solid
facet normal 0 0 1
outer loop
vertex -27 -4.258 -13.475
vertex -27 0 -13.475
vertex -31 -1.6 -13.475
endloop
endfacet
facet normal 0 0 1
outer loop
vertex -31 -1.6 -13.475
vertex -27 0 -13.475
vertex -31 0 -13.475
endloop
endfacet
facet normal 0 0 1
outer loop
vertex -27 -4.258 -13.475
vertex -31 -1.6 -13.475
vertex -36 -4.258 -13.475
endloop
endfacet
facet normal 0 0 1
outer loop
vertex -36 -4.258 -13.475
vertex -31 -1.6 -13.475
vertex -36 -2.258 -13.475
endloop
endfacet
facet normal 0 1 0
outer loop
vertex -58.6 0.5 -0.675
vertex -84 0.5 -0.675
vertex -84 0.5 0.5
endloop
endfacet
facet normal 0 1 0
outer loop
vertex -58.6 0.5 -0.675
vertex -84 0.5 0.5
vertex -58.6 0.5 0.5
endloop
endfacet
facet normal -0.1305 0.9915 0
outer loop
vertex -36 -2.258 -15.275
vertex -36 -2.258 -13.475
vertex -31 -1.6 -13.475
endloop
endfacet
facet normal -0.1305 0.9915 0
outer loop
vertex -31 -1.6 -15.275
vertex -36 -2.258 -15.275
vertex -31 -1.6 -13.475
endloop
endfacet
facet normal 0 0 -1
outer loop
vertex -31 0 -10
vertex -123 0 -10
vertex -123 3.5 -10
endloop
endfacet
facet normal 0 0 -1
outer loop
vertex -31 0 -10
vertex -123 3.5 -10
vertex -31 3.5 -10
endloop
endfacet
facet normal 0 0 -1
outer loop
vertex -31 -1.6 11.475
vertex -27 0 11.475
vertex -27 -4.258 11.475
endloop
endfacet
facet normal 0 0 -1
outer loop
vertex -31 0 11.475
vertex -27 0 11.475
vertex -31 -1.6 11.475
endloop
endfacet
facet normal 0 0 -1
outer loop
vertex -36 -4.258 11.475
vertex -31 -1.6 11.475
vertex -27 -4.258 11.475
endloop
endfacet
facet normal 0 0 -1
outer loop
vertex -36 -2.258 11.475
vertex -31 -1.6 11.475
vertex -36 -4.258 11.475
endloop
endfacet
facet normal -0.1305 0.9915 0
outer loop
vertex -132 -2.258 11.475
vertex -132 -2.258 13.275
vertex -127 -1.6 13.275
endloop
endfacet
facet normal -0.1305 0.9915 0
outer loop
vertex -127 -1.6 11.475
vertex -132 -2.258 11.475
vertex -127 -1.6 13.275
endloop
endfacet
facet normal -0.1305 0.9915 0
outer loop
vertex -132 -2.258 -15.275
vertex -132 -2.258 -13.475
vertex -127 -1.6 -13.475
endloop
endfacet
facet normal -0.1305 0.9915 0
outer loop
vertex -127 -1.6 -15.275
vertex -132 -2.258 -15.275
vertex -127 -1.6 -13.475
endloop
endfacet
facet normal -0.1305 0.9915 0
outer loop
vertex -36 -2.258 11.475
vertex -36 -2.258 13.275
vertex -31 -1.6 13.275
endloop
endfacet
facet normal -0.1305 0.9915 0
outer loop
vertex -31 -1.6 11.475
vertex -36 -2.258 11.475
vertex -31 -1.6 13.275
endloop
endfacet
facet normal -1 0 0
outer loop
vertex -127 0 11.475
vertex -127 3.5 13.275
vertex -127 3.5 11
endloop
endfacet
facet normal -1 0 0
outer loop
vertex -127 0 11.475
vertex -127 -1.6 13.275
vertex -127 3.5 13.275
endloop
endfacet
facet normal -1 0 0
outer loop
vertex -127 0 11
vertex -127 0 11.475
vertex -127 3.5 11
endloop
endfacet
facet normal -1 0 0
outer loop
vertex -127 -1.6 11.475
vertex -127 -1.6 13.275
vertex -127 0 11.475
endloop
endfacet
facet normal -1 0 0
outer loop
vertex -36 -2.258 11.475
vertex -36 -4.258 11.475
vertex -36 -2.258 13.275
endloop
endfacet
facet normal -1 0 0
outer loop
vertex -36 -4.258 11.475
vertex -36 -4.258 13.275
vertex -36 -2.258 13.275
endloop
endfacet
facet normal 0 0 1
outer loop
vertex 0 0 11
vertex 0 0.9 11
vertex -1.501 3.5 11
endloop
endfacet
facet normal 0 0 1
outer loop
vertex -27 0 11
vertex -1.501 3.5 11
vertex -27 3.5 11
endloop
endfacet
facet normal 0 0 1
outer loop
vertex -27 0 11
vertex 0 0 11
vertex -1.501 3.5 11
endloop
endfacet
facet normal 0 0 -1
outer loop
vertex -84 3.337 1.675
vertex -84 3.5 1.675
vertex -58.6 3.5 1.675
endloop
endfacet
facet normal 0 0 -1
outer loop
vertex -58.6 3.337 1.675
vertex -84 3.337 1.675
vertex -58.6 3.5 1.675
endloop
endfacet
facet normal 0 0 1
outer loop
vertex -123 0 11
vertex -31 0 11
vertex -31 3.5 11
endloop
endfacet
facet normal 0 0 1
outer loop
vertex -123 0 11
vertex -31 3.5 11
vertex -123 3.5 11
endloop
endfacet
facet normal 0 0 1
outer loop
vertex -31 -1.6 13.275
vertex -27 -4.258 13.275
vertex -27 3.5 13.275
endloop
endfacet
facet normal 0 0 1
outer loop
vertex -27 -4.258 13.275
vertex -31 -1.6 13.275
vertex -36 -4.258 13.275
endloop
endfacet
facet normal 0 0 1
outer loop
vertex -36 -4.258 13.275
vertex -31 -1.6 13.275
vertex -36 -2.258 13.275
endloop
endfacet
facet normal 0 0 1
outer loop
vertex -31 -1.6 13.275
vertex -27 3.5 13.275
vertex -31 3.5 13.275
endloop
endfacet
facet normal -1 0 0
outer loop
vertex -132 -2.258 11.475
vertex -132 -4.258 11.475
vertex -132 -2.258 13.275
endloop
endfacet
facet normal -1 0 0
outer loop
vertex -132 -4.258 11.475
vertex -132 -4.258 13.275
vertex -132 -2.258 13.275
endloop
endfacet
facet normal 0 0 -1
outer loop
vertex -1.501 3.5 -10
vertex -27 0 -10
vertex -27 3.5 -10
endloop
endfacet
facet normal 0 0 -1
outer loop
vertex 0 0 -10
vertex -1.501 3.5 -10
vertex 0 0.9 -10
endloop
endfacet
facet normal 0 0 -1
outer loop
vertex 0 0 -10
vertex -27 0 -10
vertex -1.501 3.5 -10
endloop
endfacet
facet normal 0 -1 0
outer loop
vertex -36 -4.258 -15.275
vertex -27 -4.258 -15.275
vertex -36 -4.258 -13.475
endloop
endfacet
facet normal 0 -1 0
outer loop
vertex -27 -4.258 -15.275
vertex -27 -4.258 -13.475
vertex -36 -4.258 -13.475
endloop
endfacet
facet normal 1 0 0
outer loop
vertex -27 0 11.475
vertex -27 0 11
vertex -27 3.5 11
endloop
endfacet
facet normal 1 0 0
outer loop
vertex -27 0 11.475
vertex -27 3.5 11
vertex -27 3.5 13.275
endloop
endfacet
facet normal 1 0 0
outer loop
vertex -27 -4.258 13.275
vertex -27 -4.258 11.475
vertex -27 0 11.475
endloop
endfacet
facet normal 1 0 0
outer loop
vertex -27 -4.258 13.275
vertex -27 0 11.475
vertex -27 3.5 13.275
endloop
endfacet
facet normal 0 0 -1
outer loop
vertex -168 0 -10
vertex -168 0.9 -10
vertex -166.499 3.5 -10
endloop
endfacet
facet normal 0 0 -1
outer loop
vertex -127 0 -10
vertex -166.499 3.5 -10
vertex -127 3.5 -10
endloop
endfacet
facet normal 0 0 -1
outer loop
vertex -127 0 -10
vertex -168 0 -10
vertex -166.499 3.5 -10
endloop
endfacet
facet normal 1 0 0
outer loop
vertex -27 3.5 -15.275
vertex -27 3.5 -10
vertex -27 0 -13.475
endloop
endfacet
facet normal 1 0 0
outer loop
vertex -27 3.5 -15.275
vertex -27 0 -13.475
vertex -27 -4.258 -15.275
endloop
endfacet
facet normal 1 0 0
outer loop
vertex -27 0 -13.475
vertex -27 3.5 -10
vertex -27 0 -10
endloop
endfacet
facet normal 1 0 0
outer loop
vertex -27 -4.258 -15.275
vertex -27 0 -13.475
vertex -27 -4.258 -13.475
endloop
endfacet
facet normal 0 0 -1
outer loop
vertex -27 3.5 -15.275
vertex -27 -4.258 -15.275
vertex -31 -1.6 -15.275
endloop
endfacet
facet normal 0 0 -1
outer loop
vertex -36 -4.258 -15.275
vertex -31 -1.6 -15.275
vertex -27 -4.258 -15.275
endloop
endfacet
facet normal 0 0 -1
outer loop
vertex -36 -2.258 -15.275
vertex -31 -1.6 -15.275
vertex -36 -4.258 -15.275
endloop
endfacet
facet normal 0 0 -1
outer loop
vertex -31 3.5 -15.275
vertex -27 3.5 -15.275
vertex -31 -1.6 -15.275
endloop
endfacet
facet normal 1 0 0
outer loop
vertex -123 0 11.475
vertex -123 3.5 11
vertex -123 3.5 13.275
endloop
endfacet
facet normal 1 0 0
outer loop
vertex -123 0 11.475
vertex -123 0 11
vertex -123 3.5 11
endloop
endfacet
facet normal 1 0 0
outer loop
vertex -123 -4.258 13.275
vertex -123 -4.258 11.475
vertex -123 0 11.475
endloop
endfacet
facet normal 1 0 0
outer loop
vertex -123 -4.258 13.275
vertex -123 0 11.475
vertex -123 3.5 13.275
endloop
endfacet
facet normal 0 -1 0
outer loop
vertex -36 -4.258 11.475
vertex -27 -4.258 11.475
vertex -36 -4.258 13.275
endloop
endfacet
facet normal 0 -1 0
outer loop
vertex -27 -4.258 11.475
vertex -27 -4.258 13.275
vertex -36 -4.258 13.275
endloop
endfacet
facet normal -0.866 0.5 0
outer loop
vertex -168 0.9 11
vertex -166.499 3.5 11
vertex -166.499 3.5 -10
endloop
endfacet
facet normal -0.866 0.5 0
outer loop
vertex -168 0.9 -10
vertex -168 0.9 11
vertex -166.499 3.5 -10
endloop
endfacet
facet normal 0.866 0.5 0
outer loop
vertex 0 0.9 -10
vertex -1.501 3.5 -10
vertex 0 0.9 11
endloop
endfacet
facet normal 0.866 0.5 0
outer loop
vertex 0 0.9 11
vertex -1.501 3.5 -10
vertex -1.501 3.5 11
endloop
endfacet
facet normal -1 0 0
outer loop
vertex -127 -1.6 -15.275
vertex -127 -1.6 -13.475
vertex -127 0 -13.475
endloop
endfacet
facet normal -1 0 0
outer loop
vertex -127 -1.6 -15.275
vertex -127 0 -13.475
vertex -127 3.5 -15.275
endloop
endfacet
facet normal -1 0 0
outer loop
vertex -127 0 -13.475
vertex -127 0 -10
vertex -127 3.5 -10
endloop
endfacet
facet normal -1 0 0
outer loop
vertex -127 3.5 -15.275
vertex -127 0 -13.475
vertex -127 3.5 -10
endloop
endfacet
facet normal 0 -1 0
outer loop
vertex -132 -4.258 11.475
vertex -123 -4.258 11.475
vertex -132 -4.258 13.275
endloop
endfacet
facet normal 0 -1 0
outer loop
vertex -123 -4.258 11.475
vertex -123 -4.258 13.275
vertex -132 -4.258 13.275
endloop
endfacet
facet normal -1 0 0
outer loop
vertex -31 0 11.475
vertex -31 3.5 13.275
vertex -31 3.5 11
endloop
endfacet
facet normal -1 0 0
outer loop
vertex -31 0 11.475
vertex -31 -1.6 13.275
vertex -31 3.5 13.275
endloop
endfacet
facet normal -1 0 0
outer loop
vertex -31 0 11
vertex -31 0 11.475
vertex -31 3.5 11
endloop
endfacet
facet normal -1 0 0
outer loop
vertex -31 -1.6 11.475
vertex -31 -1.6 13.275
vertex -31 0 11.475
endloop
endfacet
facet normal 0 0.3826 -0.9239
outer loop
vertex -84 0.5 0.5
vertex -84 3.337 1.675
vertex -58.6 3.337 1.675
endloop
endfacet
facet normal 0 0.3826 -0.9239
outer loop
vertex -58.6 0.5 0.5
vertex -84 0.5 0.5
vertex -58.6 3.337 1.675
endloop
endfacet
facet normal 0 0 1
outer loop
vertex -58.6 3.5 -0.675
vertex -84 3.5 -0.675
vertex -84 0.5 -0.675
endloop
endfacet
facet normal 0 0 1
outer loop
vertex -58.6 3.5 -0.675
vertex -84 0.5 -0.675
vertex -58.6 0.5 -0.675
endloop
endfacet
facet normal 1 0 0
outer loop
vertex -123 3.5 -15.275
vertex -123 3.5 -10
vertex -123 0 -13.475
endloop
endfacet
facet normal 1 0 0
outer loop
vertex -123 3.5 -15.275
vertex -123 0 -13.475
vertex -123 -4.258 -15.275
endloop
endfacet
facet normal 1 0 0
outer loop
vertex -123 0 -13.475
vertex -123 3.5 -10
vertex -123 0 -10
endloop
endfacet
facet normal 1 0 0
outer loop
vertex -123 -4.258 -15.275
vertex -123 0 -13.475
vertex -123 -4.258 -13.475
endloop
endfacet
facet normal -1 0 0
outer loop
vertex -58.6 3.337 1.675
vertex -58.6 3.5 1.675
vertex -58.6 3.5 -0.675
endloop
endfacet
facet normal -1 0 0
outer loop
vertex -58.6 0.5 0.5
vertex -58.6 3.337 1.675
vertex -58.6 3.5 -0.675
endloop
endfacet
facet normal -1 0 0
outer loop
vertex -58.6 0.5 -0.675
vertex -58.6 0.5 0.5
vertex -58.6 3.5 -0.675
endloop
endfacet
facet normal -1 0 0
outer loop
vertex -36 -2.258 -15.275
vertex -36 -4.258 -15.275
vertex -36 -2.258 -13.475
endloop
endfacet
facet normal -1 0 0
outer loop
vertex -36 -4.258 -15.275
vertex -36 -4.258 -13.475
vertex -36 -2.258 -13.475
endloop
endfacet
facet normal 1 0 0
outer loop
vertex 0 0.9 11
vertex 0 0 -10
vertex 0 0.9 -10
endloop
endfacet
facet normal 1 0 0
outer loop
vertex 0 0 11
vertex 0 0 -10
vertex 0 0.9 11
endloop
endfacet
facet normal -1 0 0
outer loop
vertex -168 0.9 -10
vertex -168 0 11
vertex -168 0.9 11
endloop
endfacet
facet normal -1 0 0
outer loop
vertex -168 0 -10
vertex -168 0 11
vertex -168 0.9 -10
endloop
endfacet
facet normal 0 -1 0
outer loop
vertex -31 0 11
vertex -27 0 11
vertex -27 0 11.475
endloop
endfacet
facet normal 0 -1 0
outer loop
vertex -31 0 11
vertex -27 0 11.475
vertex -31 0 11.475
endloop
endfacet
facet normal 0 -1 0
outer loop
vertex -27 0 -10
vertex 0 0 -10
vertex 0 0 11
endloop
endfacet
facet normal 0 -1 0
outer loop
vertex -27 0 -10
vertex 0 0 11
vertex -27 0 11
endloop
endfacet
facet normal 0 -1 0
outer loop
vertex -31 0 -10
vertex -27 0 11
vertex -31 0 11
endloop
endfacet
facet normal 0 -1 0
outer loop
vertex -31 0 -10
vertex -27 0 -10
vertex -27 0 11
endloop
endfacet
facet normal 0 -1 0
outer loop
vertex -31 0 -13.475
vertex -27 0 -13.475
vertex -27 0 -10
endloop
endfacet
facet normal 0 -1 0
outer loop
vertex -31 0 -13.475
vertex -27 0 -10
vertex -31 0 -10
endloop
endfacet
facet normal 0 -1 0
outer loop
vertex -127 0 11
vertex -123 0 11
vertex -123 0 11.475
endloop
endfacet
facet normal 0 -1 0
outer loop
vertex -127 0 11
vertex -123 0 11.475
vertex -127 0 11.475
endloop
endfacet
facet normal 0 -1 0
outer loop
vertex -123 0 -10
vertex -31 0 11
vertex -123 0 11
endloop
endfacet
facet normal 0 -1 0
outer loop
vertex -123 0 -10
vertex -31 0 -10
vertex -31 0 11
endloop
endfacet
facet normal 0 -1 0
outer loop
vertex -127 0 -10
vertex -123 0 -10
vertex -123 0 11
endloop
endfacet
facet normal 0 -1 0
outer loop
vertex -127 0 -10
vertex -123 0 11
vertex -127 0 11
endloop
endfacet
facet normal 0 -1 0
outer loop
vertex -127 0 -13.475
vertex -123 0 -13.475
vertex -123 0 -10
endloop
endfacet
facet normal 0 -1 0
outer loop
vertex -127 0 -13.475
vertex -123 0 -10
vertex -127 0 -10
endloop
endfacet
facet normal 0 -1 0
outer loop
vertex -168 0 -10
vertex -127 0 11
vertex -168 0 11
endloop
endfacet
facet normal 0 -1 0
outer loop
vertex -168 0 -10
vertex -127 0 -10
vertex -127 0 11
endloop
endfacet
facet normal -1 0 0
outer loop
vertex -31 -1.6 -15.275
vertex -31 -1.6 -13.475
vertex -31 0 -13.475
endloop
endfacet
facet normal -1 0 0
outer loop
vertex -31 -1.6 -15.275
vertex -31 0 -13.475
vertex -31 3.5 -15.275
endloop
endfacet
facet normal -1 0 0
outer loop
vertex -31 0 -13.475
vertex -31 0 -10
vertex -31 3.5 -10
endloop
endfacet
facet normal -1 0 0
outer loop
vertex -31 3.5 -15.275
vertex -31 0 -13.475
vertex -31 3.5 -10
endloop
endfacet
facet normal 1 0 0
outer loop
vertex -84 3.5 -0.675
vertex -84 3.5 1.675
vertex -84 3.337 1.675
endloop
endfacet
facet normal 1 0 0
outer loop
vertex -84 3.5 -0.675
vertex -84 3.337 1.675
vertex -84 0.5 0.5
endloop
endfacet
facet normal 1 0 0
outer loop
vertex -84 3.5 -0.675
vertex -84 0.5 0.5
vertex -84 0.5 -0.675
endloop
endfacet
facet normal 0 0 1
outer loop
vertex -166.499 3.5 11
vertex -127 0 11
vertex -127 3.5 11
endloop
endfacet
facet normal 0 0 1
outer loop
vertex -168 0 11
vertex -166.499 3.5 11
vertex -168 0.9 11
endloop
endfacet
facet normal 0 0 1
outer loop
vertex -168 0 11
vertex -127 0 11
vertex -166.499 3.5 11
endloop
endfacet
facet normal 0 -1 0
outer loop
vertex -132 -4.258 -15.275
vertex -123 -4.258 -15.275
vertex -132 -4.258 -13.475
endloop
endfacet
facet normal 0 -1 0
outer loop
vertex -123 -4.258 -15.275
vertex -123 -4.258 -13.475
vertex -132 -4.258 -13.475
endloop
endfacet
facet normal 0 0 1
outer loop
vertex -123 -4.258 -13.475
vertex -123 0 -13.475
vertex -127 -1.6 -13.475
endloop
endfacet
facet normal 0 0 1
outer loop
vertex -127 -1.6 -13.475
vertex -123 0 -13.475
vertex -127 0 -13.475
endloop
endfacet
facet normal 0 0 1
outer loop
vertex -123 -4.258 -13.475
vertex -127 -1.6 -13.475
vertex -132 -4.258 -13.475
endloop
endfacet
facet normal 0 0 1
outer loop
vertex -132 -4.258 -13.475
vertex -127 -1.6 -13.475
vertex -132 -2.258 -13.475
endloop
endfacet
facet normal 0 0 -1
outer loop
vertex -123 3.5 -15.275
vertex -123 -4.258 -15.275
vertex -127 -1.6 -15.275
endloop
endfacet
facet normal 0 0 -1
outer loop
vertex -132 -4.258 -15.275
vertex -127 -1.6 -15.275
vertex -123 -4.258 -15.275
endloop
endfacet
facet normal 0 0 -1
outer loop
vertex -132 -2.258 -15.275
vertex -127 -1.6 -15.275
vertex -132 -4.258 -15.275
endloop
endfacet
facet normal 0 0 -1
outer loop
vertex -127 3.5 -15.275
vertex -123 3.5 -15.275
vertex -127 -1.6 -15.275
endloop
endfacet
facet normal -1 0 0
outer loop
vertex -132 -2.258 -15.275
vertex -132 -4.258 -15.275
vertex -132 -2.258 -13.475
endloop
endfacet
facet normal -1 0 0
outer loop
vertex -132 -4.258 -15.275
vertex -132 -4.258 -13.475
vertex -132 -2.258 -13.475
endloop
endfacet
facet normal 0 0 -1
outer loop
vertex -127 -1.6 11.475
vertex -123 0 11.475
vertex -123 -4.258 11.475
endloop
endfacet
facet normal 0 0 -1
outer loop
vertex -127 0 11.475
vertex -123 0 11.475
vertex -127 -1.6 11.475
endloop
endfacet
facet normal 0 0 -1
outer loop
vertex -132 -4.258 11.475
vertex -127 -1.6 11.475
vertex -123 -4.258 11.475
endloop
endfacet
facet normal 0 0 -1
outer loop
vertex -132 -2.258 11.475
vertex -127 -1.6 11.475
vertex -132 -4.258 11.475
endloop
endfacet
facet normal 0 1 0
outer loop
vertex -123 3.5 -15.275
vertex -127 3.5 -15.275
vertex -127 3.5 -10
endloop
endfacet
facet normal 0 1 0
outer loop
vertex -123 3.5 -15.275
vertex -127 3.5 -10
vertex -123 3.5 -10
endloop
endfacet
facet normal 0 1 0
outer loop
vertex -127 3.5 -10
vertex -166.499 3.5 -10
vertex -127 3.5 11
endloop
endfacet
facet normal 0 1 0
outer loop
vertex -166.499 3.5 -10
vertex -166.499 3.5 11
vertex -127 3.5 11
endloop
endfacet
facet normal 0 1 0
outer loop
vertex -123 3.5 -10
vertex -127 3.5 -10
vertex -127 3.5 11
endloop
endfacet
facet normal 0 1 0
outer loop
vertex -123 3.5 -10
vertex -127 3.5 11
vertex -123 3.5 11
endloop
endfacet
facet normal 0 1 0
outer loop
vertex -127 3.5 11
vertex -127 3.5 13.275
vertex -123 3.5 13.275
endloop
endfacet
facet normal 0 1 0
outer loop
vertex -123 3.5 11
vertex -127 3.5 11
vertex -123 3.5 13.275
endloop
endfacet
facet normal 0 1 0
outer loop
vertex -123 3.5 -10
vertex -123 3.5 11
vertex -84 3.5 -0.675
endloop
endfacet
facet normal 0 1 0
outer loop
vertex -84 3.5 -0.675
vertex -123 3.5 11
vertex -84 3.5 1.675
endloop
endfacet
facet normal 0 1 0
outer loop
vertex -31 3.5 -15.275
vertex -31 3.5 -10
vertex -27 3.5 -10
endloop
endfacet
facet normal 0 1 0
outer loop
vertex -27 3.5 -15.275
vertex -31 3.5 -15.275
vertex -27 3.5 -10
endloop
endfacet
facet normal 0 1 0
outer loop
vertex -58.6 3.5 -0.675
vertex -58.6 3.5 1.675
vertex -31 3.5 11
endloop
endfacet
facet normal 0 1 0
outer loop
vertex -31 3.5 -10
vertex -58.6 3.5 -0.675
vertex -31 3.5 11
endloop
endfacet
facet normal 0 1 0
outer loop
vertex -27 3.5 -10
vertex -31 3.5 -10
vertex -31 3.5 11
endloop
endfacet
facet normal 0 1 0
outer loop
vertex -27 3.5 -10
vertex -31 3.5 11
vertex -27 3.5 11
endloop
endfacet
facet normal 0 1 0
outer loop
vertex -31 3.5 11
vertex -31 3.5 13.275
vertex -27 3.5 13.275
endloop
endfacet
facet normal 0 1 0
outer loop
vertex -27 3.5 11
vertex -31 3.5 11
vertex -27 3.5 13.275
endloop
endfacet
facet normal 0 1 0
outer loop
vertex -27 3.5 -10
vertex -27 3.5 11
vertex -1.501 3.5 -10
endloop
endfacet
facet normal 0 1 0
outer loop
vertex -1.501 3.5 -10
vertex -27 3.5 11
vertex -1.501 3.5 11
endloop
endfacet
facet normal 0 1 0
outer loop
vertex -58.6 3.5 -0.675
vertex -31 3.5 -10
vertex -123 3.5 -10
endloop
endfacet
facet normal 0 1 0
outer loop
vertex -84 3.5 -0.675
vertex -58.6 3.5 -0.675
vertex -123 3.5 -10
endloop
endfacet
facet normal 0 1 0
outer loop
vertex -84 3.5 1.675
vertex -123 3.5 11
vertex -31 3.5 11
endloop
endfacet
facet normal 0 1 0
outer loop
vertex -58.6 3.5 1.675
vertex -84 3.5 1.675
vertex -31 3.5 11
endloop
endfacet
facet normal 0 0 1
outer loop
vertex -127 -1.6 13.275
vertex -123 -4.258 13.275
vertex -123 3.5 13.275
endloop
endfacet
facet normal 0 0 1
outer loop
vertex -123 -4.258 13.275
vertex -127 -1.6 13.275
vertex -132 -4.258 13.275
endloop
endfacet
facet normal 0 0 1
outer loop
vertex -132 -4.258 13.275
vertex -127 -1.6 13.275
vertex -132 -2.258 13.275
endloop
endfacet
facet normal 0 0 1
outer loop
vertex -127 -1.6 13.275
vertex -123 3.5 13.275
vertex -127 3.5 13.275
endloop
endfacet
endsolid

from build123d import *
from OCP.BRepFilletAPI import BRepFilletAPI_MakeChamfer

# Parameters (mm, degrees)
THICKNESS_EXTRUDE_DEPTH     = 3.5
HOOK_1_EXTRUDE_DEPTH        = 0.9
HOOK_START                  = -26.75
HOOK_2_EXTRUDE_DEPTH        = 0.9
HOOK_PATTERN_COUNT          = 2
HOOK_PATTERN_PITCH          = 96
HANDLE_SKETCH_W             = 25.4
HANDLE_SKETCH_H             = 2.35
HANDLE_SLOT_CUT_DEPTH       = 3
HANDLE_SLOT_CHAMFER_1_SIZE  = 1.175
HANDLE_SLOT_CHAMFER_1_SIZE2 = 2.836700936
END_CHAMFERS_SIZE           = 2.6
END_CHAMFERS_SIZE2          = 1.5011107


with BuildPart() as part:
    # Top Sketch → Thickness Extrude (new body)
    with BuildSketch(Plane(origin=(0, 0, 0), x_dir=(1, 0, 0), z_dir=(0, 1, 0))):
        Polygon((-27, -11), (-27, -12.375), (-31, -12.375), (-31, -11), (-123, -11), (-123, -12.375), (-127, -12.375), (-127, -11), (-168, -11), (-168, 10), (-127, 10), (-127, 14.375), (-123, 14.375), (-123, 10), (-31, 10), (-31, 14.375), (-27, 14.375), (-27, 10), (0, 10), (0, -11), align=None)
    extrude(amount=THICKNESS_EXTRUDE_DEPTH)


with BuildPart() as body_2:
    # Hook Sketch → Hook 1 Extrude (new, symmetric)
    with BuildSketch(Plane.XY.offset(12.375)):
        Polygon((-31, 3.5), (-27, 3.5), (-27, -4.258262488), (-36, -4.258262488), (-36, -2.258262488), (-31, -1.6), align=None)
    hook_1_extrude = extrude(amount=HOOK_1_EXTRUDE_DEPTH, both=True)


with BuildPart() as body_3:
    # Hook Sketch<2> → Hook 2 Extrude (new, symmetric)
    with BuildSketch(Plane.XY.offset(12.375).offset(HOOK_START)):
        Polygon((-31, 3.5), (-27, 3.5), (-27, -4.258262488), (-36, -4.258262488), (-36, -2.258262488), (-31, -1.6), align=None)
    hook_2_extrude = extrude(amount=HOOK_2_EXTRUDE_DEPTH, both=True)


with BuildPart() as hook_pattern_1:
    # Hook Pattern: pattern copy
    add(hook_1_extrude.moved(Location(Vector(-1, 0, 0) * (1 * HOOK_PATTERN_PITCH))))


with BuildPart() as hook_pattern_2:
    # Hook Pattern: pattern copy
    add(hook_2_extrude.moved(Location(Vector(-1, 0, 0) * (1 * HOOK_PATTERN_PITCH))))


with BuildPart() as part_1:
    add(part.part)

    # Combine Bodies: union body 2, body 3, Hook Pattern_1, Hook Pattern_2
    add(body_2.part)
    add(body_3.part)
    add(hook_pattern_1.part)
    add(hook_pattern_2.part)

    # Handle Sketch → Handle Slot Cut (cut)
    with BuildSketch(Plane(origin=(0, 3.5, 0), x_dir=(1, 0, 0), z_dir=(0, 1, 0))):
        with Locations((-71.3, -0.5)):
            Rectangle(HANDLE_SKETCH_W, HANDLE_SKETCH_H)
    extrude(amount=-HANDLE_SLOT_CUT_DEPTH, mode=Mode.SUBTRACT)

    # Handle Slot Chamfer 1
    handle_slot_chamfer_1_edges = [part_1.edges().sort_by_distance(p)[0] for p in [
        (-71.3, 0.5, 1.675),
    ]]
    handle_slot_chamfer_1_side = [part_1.faces().sort_by_distance(p)[0] for p in [
        (-71.3, 0.5, 0.5),
    ]]
    chamfer(handle_slot_chamfer_1_edges, length=HANDLE_SLOT_CHAMFER_1_SIZE, length2=HANDLE_SLOT_CHAMFER_1_SIZE2, reference=handle_slot_chamfer_1_side[0])

    # End Chamfers: one chamfer whose edges measure the first distance from different faces: ONE call of the kernel's chamfer builder (chamfer() names one face for all edges)
    end_chamfers_edges_1 = [part_1.edges().sort_by_distance(p)[0] for p in [
        (0, 3.5, 0.5),
    ]]
    end_chamfers_side_1 = [part_1.faces().sort_by_distance(p)[0] for p in [
        (0, 1.75, 0.5),
    ]]
    end_chamfers_edges_2 = [part_1.edges().sort_by_distance(p)[0] for p in [
        (-168, 3.5, 0.5),
    ]]
    end_chamfers_side_2 = [part_1.faces().sort_by_distance(p)[0] for p in [
        (-168, 1.75, 0.5),
    ]]
    end_chamfers = BRepFilletAPI_MakeChamfer(part_1.part.solid().wrapped)
    for e in end_chamfers_edges_1:
        end_chamfers.Add(END_CHAMFERS_SIZE, END_CHAMFERS_SIZE2, e.wrapped, end_chamfers_side_1[0].wrapped)  # the first distance lies on this face
    for e in end_chamfers_edges_2:
        end_chamfers.Add(END_CHAMFERS_SIZE, END_CHAMFERS_SIZE2, e.wrapped, end_chamfers_side_2[0].wrapped)  # the first distance lies on this face
    add(Compound.cast(end_chamfers.Shape()), mode=Mode.REPLACE)


solid = part_1.part
